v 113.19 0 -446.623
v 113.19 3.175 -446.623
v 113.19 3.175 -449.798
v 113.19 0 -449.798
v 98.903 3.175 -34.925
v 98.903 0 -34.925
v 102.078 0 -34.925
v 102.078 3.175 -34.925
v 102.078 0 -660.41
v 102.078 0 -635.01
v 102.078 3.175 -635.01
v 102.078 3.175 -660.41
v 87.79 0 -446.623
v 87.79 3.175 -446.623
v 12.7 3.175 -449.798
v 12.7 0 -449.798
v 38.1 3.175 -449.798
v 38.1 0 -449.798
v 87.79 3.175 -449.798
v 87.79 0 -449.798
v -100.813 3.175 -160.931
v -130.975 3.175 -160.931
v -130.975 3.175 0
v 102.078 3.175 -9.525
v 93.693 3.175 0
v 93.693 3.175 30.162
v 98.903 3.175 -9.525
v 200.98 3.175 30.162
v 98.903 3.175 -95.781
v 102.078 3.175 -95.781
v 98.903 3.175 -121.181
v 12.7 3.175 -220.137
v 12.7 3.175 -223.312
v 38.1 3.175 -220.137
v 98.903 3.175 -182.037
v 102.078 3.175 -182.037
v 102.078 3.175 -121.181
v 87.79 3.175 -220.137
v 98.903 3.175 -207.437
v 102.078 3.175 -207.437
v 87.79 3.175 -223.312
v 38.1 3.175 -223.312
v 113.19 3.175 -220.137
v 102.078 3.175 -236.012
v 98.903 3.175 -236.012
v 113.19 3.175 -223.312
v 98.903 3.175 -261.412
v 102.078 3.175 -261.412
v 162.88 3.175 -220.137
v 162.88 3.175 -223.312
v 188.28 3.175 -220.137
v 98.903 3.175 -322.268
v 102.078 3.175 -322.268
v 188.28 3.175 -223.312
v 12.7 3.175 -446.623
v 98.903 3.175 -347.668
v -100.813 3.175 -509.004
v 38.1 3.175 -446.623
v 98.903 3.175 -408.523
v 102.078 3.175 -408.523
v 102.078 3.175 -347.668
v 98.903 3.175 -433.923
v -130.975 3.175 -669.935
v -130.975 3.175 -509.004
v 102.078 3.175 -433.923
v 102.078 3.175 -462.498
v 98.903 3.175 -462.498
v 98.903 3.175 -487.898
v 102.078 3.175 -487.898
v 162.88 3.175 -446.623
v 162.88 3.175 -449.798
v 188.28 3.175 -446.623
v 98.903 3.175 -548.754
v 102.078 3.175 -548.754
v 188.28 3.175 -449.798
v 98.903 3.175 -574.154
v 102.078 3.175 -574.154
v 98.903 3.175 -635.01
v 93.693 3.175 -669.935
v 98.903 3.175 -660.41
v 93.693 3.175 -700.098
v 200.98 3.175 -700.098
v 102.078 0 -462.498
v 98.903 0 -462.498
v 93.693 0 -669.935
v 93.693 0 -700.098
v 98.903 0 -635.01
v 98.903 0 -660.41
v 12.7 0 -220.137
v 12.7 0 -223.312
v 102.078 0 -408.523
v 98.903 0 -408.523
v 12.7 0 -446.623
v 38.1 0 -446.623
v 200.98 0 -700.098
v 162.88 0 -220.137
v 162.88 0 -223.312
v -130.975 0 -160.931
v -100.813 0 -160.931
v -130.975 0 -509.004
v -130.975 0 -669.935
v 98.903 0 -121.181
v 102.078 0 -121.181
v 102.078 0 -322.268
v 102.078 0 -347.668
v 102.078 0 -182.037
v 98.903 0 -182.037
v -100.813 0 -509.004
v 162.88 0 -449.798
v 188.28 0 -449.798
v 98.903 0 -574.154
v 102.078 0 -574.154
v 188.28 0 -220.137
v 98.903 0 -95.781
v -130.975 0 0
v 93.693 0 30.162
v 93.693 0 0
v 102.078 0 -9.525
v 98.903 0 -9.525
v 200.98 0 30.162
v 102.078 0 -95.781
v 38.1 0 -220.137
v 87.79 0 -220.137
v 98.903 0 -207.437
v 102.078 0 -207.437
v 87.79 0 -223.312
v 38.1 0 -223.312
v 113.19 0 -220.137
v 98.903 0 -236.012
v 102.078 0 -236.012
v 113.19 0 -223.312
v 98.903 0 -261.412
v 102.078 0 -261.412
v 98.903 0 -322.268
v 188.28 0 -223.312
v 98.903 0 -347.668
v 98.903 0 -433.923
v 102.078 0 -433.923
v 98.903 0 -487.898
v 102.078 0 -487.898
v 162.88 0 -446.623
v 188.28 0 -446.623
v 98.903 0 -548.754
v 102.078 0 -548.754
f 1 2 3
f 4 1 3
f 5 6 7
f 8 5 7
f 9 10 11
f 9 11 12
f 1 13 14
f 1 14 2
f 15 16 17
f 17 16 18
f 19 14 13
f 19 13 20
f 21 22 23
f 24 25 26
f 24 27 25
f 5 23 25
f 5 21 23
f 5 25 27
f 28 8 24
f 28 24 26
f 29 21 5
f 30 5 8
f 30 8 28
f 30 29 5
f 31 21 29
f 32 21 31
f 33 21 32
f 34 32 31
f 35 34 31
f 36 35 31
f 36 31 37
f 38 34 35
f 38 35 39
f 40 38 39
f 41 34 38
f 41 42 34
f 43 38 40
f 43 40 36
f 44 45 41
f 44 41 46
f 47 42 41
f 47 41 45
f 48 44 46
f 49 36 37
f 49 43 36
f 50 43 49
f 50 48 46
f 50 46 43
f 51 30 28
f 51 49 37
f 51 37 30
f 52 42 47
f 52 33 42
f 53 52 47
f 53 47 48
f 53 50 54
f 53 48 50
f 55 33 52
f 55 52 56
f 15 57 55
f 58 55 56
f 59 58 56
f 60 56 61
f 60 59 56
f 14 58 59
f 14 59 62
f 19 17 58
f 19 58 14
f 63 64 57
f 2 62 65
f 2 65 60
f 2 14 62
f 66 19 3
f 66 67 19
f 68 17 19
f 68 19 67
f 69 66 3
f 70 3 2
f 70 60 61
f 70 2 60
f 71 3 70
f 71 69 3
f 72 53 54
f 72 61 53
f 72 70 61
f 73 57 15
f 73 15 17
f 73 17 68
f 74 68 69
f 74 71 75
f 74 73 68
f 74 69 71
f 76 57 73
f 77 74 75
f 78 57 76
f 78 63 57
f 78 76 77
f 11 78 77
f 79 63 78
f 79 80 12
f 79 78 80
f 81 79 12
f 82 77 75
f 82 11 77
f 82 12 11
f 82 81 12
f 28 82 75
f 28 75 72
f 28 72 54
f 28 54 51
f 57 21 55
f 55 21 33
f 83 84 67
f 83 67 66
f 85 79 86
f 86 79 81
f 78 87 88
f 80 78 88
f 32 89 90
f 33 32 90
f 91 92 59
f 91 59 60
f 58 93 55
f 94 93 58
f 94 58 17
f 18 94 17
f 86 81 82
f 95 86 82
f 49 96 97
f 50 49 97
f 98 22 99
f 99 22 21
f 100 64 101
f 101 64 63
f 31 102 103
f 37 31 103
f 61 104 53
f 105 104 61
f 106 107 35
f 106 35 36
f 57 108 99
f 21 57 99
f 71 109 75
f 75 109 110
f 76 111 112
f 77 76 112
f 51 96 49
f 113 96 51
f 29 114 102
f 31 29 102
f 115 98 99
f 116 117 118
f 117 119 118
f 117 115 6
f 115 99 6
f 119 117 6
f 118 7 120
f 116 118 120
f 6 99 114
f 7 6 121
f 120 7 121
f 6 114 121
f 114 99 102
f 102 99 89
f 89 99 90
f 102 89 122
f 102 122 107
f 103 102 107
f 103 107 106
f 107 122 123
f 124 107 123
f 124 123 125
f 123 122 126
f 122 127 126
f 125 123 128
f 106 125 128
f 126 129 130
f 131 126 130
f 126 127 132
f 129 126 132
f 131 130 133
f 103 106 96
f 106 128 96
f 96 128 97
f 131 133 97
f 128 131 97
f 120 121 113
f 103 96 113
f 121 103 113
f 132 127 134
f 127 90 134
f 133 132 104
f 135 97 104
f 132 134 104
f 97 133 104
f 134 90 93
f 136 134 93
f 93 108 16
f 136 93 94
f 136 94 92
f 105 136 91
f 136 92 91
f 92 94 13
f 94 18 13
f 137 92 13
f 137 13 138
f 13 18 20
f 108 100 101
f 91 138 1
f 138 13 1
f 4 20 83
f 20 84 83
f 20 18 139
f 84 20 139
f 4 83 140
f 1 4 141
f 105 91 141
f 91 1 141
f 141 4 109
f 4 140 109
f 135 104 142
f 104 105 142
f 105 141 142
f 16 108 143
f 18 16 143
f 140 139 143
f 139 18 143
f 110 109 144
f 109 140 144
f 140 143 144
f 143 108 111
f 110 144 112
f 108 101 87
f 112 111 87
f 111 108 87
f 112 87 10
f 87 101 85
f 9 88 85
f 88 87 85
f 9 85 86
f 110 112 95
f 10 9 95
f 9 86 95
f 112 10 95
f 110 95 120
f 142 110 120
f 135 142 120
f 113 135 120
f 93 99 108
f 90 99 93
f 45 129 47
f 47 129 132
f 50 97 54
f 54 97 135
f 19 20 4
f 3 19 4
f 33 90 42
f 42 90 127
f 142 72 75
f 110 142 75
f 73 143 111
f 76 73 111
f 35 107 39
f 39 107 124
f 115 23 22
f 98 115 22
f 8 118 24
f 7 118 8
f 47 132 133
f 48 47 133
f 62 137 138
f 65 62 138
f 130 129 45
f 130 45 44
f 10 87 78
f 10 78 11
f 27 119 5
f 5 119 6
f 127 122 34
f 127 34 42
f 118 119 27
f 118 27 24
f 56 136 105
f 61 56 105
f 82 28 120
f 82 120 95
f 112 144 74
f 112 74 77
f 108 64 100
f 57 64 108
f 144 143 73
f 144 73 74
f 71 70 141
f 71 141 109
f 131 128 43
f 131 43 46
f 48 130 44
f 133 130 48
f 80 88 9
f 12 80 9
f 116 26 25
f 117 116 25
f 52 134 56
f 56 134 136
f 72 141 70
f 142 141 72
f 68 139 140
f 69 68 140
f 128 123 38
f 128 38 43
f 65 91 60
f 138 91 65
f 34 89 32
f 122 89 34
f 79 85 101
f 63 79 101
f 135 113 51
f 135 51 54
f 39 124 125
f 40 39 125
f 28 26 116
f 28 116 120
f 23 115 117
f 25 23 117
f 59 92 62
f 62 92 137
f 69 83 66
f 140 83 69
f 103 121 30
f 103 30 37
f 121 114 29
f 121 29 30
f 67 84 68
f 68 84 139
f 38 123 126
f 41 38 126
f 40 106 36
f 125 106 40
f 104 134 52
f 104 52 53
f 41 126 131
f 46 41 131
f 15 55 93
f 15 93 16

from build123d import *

# Parameters (mm, degrees)
SKETCH3_W           = 25.4
SKETCH3_H           = 3.175
SKETCH3_W_2         = 3.175
SKETCH3_H_2         = 25.4
BOSS_EXTRUDE1_DEPTH = 3.175
SKETCH6_W           = 107.287119944
SKETCH6_H           = 30.1625
SKETCH6_W_2         = 30.1625
SKETCH6_H_2         = 160.930679916
BOSS_EXTRUDE2_DEPTH = 3.175


with BuildPart() as part:
    # Sketch3 → Boss-Extrude1 (new body)
    with BuildSketch(Plane(origin=(0, 0, 0), x_dir=(1, 0, 0), z_dir=(0, 1, 0))):
        Polygon((0, 0), (200.98004, 0), (200.98004, 669.93516), (0, 669.93516), (-100.8126, 669.93516), (-100.8126, 0), align=None)
        with Locations((25.4, 448.21094)):
            Rectangle(SKETCH3_W, SKETCH3_H, mode=Mode.SUBTRACT)
        with Locations((175.58004, 448.21094)):
            Rectangle(SKETCH3_W, SKETCH3_H, mode=Mode.SUBTRACT)
        with Locations((100.49002, 448.21094)):
            Rectangle(SKETCH3_W, SKETCH3_H, mode=Mode.SUBTRACT)
        with Locations((100.49002, 647.71016)):
            Rectangle(SKETCH3_W_2, SKETCH3_H_2, mode=Mode.SUBTRACT)
        with Locations((100.49002, 475.19844)):
            Rectangle(SKETCH3_W_2, SKETCH3_H_2, mode=Mode.SUBTRACT)
        with Locations((100.49002, 561.4543)):
            Rectangle(SKETCH3_W_2, SKETCH3_H_2, mode=Mode.SUBTRACT)
        with Locations((100.49002, 421.22344)):
            Rectangle(SKETCH3_W_2, SKETCH3_H_2, mode=Mode.SUBTRACT)
        with Locations((100.49002, 334.96758)):
            Rectangle(SKETCH3_W_2, SKETCH3_H_2, mode=Mode.SUBTRACT)
        with Locations((100.49002, 248.71172)):
            Rectangle(SKETCH3_W_2, SKETCH3_H_2, mode=Mode.SUBTRACT)
        with Locations((25.4, 221.72422)):
            Rectangle(SKETCH3_W, SKETCH3_H, mode=Mode.SUBTRACT)
        with Locations((100.49002, 221.72422)):
            Rectangle(SKETCH3_W, SKETCH3_H, mode=Mode.SUBTRACT)
        with Locations((175.58004, 221.72422)):
            Rectangle(SKETCH3_W, SKETCH3_H, mode=Mode.SUBTRACT)
        with Locations((100.49002, 22.225)):
            Rectangle(SKETCH3_W_2, SKETCH3_H_2, mode=Mode.SUBTRACT)
        with Locations((100.49002, 108.48086)):
            Rectangle(SKETCH3_W_2, SKETCH3_H_2, mode=Mode.SUBTRACT)
        with Locations((100.49002, 194.73672)):
            Rectangle(SKETCH3_W_2, SKETCH3_H_2, mode=Mode.SUBTRACT)
    extrude(amount=BOSS_EXTRUDE1_DEPTH)

    # Sketch6 → Boss-Extrude2 (add)
    with BuildSketch(Plane(origin=(0, 3.175, 0), x_dir=(1, 0, 0), z_dir=(0, 1, 0))):
        with Locations((147.336480028, -15.08125)):
            Rectangle(SKETCH6_W, SKETCH6_H)
        with Locations((147.336480028, 685.01641)):
            Rectangle(SKETCH6_W, SKETCH6_H)
        with Locations((-115.89385, 589.469820042)):
            Rectangle(SKETCH6_W_2, SKETCH6_H_2)
        with Locations((-115.89385, 80.465339958)):
            Rectangle(SKETCH6_W_2, SKETCH6_H_2)
    extrude(amount=-BOSS_EXTRUDE2_DEPTH)


solid = part.part
